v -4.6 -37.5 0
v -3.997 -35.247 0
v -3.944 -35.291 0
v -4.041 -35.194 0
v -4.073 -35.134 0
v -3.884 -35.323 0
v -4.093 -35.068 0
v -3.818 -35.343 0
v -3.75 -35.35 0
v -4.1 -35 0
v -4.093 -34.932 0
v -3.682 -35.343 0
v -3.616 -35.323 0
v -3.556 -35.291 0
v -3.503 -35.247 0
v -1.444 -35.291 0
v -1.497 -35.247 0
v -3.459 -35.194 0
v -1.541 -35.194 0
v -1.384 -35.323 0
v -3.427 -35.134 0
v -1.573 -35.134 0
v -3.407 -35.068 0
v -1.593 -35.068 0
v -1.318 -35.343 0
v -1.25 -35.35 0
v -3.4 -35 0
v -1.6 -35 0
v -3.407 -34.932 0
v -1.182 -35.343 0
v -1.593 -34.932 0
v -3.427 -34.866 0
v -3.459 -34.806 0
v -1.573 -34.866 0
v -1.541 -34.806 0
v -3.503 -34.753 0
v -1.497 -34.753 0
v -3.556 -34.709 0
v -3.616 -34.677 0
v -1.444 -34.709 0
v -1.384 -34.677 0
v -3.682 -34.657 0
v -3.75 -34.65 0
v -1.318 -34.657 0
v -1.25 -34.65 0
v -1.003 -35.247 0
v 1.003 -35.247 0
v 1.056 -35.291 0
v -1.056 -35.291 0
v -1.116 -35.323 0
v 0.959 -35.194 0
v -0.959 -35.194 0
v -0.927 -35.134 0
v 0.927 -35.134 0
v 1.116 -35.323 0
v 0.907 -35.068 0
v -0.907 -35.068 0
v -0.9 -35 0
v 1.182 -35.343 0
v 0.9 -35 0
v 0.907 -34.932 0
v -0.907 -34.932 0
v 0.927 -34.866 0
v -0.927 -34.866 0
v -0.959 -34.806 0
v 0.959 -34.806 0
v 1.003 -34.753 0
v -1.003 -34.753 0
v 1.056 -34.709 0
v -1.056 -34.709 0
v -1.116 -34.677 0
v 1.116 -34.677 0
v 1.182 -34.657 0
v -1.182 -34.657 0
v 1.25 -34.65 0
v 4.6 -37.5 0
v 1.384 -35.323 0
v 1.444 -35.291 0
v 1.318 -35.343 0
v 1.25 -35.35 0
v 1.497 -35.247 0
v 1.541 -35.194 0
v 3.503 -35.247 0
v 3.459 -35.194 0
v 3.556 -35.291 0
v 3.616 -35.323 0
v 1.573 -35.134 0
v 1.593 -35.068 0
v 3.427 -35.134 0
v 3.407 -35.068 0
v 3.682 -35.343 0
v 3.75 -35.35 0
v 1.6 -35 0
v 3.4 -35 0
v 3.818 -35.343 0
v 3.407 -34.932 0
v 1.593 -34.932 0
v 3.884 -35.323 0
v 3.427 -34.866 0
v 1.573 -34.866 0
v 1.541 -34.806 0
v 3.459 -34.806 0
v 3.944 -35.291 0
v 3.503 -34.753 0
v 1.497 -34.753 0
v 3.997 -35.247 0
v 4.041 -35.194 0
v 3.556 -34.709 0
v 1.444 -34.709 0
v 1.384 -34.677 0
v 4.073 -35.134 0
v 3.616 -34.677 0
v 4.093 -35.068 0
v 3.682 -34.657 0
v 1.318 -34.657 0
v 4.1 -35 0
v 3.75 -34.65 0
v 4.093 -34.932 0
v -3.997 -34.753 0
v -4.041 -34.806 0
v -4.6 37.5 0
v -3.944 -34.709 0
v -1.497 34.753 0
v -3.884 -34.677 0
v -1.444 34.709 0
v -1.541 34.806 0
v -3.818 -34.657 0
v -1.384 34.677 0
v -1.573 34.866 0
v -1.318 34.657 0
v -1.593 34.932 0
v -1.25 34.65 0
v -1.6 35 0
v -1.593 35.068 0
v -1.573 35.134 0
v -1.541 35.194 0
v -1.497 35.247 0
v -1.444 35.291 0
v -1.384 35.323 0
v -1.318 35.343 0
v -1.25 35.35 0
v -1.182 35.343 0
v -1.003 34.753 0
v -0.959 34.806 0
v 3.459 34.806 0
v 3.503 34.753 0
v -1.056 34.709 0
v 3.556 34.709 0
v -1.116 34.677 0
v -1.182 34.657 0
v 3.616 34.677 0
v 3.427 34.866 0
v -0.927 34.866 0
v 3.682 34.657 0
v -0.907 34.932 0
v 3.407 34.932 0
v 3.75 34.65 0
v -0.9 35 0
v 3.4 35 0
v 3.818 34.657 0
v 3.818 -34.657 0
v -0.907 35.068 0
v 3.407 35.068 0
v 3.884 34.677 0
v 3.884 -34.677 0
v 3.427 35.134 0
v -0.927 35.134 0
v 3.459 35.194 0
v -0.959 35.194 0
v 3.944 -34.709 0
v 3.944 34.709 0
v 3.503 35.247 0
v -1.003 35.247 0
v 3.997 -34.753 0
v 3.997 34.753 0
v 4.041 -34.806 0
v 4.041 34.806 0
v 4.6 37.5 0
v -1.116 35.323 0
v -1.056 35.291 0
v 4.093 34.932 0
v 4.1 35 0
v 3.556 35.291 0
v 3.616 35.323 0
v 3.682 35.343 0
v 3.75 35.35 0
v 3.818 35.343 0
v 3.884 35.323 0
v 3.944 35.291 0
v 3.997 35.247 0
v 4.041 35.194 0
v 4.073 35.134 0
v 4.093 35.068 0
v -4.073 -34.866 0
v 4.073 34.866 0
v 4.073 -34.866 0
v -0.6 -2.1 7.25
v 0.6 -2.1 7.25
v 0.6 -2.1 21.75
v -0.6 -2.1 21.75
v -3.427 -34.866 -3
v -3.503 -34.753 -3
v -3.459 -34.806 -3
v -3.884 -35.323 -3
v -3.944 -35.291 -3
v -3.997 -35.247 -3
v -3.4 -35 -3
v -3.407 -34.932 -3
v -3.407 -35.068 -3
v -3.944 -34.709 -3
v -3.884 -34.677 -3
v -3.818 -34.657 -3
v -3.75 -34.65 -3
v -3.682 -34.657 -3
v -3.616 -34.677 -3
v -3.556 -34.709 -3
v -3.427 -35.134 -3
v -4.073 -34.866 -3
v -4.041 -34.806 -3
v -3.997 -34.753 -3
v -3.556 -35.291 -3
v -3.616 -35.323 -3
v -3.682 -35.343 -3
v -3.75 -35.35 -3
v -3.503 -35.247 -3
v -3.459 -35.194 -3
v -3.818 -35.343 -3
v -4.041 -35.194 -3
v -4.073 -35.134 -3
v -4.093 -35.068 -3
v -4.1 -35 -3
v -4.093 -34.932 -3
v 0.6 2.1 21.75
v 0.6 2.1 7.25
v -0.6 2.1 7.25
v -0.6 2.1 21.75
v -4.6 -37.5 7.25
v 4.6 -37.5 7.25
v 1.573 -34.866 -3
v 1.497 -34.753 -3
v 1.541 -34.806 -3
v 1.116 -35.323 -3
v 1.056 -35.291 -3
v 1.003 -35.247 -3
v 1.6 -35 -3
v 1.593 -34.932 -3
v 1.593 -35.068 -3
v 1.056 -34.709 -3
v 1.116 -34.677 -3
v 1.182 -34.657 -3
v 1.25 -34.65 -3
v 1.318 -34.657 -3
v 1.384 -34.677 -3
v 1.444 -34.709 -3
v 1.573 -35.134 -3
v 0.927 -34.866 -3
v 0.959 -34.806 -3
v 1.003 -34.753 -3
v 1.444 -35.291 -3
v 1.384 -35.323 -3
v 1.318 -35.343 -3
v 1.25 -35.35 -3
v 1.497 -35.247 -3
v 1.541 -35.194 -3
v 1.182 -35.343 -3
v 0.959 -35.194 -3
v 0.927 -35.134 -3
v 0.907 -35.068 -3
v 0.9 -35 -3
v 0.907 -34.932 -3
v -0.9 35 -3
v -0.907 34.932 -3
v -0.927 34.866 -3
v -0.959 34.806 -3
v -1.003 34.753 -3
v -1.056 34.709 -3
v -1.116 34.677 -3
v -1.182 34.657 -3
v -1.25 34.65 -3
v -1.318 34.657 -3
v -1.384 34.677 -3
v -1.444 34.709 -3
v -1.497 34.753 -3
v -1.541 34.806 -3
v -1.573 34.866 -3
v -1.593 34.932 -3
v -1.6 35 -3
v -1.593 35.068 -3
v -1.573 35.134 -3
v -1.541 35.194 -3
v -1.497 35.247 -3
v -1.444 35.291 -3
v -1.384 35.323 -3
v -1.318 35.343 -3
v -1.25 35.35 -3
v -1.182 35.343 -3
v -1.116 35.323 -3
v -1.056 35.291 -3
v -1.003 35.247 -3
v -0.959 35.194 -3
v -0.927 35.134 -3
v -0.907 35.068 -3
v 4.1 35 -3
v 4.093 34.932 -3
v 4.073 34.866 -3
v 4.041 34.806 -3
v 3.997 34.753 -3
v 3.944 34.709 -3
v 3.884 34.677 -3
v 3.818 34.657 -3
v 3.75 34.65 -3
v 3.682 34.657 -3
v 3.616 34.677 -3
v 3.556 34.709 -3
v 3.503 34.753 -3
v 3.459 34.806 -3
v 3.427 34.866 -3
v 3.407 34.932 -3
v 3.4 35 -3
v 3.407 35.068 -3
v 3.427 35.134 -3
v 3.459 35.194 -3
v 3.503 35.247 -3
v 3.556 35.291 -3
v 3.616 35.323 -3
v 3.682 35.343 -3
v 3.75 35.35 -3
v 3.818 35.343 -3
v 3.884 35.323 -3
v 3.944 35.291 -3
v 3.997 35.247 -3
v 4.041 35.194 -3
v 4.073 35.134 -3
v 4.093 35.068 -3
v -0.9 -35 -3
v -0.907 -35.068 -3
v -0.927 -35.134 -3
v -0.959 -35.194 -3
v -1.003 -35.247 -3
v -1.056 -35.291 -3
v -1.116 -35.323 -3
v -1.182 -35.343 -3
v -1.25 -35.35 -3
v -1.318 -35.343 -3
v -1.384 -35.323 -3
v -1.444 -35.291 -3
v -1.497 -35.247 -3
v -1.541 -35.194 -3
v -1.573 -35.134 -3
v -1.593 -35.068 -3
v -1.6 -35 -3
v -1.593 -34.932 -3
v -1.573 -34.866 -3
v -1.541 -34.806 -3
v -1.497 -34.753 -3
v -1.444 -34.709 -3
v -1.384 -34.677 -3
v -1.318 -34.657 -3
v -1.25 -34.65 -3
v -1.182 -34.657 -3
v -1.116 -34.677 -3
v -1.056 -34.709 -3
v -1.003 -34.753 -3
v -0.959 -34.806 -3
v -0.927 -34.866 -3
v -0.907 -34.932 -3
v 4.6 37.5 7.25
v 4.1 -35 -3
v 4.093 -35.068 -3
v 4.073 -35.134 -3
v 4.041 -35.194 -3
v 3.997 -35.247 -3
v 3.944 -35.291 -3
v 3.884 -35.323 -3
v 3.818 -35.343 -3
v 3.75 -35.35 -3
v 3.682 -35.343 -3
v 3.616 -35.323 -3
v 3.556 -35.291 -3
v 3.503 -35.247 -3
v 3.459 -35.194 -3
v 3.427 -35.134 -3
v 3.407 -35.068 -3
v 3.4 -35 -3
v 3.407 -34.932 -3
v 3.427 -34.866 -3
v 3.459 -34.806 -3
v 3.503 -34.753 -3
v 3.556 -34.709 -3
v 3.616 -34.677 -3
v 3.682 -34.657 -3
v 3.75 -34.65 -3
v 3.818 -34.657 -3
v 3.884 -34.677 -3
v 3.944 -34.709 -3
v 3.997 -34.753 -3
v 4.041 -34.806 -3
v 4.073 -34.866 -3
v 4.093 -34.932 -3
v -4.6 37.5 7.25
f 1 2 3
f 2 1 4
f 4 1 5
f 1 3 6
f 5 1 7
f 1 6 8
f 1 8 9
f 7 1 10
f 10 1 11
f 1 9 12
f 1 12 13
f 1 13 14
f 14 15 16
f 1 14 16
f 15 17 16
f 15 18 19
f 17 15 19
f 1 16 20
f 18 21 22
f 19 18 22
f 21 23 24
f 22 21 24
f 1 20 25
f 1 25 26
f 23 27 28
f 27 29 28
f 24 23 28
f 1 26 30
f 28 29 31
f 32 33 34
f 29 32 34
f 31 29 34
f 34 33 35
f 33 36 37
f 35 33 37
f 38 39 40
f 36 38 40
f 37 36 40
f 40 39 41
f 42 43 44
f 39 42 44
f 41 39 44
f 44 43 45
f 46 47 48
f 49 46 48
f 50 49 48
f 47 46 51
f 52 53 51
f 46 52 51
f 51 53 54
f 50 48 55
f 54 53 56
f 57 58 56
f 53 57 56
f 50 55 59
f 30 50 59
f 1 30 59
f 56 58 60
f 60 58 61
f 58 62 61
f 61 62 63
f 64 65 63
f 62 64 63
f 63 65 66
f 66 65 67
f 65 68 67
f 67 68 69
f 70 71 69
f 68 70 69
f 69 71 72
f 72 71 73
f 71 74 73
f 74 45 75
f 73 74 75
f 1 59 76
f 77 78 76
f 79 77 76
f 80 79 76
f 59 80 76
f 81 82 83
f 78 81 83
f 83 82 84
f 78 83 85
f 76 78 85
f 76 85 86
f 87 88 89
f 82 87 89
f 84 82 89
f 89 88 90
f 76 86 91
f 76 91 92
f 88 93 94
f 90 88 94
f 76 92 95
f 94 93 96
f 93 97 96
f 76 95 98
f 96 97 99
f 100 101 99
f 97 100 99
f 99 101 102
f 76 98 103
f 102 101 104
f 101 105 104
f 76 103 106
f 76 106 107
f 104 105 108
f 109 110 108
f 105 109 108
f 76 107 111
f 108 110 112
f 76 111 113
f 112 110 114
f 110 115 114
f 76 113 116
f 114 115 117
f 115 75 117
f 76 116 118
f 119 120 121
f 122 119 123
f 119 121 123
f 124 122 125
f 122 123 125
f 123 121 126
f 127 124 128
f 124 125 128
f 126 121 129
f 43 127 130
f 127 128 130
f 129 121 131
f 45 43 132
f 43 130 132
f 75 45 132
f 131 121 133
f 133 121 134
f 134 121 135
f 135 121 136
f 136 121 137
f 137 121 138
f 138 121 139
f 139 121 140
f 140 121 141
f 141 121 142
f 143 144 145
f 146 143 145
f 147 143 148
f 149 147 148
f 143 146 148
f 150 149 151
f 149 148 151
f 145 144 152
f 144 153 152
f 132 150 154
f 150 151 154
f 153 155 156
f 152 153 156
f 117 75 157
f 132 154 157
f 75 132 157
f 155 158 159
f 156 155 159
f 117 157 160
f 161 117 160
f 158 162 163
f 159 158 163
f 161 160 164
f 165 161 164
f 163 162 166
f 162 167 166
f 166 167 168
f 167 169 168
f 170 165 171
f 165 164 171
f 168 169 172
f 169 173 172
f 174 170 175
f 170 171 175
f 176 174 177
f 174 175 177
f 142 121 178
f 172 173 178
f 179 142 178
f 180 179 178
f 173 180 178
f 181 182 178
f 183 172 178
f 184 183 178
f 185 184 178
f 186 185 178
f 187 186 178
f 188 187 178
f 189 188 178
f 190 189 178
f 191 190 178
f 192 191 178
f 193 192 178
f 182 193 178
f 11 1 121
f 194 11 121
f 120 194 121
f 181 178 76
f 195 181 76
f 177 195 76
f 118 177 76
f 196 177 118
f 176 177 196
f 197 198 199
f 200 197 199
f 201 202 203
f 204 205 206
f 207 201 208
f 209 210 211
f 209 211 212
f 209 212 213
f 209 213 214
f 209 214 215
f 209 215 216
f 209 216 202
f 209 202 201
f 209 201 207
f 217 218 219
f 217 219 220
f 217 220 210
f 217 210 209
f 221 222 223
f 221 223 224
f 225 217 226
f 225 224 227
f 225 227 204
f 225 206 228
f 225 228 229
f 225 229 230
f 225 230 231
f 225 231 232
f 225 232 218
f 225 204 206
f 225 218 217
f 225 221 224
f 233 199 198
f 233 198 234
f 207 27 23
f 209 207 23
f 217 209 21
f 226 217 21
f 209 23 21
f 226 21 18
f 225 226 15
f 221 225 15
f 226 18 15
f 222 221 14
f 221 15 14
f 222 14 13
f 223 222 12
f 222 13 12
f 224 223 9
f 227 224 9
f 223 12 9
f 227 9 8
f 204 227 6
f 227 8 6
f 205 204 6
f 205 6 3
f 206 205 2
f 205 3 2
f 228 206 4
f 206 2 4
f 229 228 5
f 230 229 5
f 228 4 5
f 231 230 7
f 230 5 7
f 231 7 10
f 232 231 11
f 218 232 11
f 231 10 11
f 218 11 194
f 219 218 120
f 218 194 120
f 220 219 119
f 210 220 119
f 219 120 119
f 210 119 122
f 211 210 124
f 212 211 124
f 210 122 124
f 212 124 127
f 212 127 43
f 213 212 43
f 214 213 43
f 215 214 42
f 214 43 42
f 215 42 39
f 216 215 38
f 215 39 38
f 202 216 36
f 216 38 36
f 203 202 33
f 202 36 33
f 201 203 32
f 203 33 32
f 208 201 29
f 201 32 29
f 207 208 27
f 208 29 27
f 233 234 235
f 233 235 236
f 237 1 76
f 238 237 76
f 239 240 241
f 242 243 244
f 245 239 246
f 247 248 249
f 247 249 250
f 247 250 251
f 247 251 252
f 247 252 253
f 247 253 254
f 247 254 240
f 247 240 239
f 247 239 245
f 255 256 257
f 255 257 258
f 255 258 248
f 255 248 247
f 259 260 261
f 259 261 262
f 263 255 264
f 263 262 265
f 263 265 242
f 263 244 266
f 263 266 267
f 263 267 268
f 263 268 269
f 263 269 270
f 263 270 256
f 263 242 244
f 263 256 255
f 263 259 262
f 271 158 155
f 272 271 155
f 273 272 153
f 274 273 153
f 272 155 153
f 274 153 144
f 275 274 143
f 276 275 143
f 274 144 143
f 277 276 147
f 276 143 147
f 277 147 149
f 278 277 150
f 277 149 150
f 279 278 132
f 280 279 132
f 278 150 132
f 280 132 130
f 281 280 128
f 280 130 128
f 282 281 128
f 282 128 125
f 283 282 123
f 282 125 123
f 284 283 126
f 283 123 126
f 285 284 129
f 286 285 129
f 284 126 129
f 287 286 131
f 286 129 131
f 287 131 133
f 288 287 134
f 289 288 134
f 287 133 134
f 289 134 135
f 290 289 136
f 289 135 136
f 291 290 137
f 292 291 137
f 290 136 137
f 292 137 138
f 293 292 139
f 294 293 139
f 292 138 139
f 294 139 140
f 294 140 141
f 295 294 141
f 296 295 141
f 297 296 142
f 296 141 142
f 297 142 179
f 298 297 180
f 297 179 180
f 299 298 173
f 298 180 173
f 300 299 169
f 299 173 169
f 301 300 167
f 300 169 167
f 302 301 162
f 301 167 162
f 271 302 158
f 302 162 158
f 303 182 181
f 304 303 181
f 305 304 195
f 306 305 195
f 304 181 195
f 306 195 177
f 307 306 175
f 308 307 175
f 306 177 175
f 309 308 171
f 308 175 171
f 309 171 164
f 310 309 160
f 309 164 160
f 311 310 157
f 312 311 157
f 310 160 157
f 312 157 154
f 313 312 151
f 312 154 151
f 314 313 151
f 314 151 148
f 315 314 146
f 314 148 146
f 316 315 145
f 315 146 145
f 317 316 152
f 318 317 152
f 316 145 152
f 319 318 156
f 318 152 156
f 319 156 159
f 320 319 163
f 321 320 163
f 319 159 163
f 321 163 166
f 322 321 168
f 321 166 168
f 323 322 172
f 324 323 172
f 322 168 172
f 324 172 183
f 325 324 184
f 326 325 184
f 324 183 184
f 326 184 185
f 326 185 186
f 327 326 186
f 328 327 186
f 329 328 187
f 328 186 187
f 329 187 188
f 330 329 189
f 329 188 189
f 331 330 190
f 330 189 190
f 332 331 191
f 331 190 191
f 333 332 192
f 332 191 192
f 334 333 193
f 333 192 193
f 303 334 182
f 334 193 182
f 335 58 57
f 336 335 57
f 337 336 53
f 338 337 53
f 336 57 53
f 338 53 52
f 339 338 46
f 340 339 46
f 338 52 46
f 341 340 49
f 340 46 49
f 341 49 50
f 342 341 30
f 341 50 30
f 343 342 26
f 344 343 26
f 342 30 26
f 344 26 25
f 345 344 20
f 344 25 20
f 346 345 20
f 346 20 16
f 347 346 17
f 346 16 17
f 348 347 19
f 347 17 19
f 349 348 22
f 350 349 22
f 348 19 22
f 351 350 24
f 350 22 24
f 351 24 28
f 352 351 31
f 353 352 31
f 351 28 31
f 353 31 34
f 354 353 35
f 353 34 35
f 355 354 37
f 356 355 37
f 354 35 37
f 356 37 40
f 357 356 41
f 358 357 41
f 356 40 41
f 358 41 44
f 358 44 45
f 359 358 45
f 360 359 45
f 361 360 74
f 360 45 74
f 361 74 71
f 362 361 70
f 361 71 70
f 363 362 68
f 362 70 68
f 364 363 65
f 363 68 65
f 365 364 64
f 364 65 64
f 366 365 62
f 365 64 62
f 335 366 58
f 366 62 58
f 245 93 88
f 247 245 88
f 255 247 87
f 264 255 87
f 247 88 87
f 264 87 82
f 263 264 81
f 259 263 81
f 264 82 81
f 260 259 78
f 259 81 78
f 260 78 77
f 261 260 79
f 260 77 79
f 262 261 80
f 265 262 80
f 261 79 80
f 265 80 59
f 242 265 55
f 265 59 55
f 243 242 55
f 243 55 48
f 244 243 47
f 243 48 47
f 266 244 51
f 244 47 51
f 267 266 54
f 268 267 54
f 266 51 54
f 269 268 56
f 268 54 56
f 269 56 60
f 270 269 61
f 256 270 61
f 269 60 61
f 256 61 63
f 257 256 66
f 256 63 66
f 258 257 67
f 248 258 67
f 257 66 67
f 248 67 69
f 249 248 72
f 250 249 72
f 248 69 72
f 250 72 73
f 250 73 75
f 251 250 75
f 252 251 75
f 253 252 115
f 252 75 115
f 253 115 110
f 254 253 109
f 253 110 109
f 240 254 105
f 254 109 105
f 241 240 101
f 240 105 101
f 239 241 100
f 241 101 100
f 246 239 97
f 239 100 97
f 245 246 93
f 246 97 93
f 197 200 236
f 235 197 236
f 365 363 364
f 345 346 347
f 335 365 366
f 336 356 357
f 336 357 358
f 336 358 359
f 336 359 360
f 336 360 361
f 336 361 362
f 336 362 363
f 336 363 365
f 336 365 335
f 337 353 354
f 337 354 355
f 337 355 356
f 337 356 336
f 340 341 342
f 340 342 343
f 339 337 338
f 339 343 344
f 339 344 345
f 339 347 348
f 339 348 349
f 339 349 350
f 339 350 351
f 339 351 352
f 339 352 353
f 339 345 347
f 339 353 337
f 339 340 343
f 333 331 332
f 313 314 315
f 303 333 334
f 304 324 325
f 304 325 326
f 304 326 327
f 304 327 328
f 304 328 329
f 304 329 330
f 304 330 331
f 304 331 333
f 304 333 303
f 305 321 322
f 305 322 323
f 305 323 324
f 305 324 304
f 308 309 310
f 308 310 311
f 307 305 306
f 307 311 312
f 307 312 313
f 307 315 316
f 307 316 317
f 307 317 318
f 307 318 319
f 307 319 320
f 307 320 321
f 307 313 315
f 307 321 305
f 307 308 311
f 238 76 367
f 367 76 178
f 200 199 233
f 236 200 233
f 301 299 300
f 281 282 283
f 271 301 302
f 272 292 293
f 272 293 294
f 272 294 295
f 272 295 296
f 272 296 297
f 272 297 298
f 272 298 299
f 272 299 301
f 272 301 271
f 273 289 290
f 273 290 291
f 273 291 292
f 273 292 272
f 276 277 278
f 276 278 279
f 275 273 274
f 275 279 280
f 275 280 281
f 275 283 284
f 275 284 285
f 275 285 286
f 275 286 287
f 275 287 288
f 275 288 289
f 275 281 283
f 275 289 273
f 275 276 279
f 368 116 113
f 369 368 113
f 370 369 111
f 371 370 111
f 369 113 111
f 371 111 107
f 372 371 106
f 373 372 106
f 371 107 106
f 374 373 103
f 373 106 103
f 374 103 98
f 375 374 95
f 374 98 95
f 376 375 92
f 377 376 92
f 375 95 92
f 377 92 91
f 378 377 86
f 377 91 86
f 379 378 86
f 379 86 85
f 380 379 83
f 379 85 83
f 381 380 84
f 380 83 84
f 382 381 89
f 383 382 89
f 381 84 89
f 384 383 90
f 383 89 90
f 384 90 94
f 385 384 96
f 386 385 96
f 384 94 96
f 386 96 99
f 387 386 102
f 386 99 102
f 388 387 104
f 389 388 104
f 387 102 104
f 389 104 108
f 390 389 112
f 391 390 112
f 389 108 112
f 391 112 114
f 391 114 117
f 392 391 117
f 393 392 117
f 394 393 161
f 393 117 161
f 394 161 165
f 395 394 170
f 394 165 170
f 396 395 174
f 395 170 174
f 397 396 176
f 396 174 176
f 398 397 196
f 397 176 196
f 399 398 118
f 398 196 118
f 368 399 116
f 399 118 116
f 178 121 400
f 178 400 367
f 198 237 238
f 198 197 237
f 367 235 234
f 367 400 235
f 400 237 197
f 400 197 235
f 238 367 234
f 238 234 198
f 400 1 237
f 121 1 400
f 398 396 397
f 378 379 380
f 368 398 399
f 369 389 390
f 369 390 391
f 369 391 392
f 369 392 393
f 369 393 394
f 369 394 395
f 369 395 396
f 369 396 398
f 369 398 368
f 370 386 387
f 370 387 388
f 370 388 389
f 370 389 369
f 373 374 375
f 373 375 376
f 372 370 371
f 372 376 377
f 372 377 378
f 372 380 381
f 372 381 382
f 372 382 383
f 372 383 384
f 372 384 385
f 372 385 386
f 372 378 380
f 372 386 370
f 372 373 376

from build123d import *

# Parameters (mm, degrees)
SKETCH_W     = 9.2
SKETCH_H     = 75
PAD_DEPTH    = 7.25
SKETCH001_W  = 4.2
SKETCH001_H  = 20.5
PAD001_DEPTH = 1.2
SKETCH002_R  = 0.35
PAD002_DEPTH = 3


with BuildPart() as part:
    # Sketch → Pad (new body)
    with BuildSketch(Plane.XY):
        Rectangle(SKETCH_W, SKETCH_H)
    extrude(amount=PAD_DEPTH)

    # Sketch001 (on Face2 of Pad) → Pad001 (join)
    with BuildSketch(Plane.YZ.offset(0.6)):
        with Locations((0, 11.5)):
            Rectangle(SKETCH001_W, SKETCH001_H)
    extrude(amount=-PAD001_DEPTH)

    # Sketch002 (on Face4 of Pad001) → Pad002 (join)
    with BuildSketch(Plane(origin=(0, 0, 0), x_dir=(1, 0, 0), z_dir=(0, 0, -1))):
        with Locations((-3.75, 35)):
            Circle(SKETCH002_R)
        with Locations((-1.25, 35)):
            Circle(SKETCH002_R)
        with Locations((1.25, 35)):
            Circle(SKETCH002_R)
        with Locations((3.75, 35)):
            Circle(SKETCH002_R)
        with Locations((3.75, -35)):
            Circle(SKETCH002_R)
        with Locations((-1.25, -35)):
            Circle(SKETCH002_R)
    extrude(amount=PAD002_DEPTH)


solid = part.part
